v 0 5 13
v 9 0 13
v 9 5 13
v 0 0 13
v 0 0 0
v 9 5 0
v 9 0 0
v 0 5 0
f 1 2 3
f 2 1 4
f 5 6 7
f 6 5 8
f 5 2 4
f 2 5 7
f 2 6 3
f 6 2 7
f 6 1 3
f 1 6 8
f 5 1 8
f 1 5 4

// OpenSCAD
// Generated by SolidPython 1.0.1 on 2020-07-29 00:46:55


cube(size = [9, 5, 13]);
/***********************************************
*********      SolidPython code:      **********
************************************************
 
# import packages: SolidPython
from solid import *
from solid.utils import *
from itertools import chain, combinations, permutations


class Resize:

    def __init__(self, scad_file):
        self.scad_file = scad_file
        #self.scad_file = import_scad(scad_file)
        # cone/cylinder param:
        self.r1 = 0
        self.r2 = 0
        self.h = 0
        # rectangular prism param:
        self.w = 0
        self.l = 0
        # ellipse param:
        self.r = 0

    # import OpenScad code (file name corresponds to shape)


    # classify shape + parameters
    def assign(self, param1, param2, param3):
        if self.scad_file == 'cone.scad':
            self.r1 = param1
            self.r2 = param2
            self.h = param3
        elif self.scad_file == 'cylinder.scad':
            self.r1 = param1
            self.r2 = param2
            self.h = param3
        elif self.scad_file == 'rectangularPrism.scad':
            self.h = param1
            self.l = param2
            self.w = param3
        else:
            self.r = param1
            self.h = param2

    # resize parameters
    def iterate(self):
        x = range(3, 20, 2)
        i = 1
        if self.scad_file == 'cone.scad':
            tempList = list(permutations(x, 2))
            for temp in tempList:
                param1 = temp[0]
                param2 = temp[1]
                filepath = 'produced_scad_files/' + 'cone' + str(param1) + '_' + str(param2) + '_' + '.scad'
                scad_render_to_file(cylinder(h=param1, r1=param2, r2=0), filepath)

        elif self.scad_file == 'cylinder.scad':
            tempList = list(permutations(x, 3))
            for temp in tempList:
                param1 = temp[0]
                param2 = temp[1]
                filepath = 'produced_scad_files/' + 'cylinder' + str(param1) + '_' + str(param2) + '_' + '.scad'
                scad_render_to_file(cylinder(h=param1, r1=param2, r2=param2), filepath)

        elif self.scad_file == 'rectangularPrism.scad':
            tempList = list(permutations(x, 3))
            for temp in tempList:
                param1 = temp[0]
                param2 = temp[1]
                param3 = temp[2]
                filepath = 'produced_scad_files/' + 'rectangularPrism' + str(param1) + '_' + str(param2) + '_' + str(
                    param3) + '.scad'
                scad_render_to_file(cube(size=(param1, param2, param3)), filepath)

        elif self.scad_file == 'ellipse.scad':
            tempList = list(permutations(x, 4))
            for temp in tempList:
                param1 = temp[0]
                param2 = temp[1]
                param3 = temp[2]
                param4 = temp[3]
                filepath = 'produced_scad_files/' + 'ellipse' + str(param1) + '_' + str(param2) + '_' + str(param3) + '_' + str(param4) + '.scad'
                scad_render_to_file(scale([param1, param2, param3])(sphere(r=param4)), filepath)

    def render_to_scadfile(self):
        scad_render_to_file(scad, 'example.scad') 
 
************************************************/
